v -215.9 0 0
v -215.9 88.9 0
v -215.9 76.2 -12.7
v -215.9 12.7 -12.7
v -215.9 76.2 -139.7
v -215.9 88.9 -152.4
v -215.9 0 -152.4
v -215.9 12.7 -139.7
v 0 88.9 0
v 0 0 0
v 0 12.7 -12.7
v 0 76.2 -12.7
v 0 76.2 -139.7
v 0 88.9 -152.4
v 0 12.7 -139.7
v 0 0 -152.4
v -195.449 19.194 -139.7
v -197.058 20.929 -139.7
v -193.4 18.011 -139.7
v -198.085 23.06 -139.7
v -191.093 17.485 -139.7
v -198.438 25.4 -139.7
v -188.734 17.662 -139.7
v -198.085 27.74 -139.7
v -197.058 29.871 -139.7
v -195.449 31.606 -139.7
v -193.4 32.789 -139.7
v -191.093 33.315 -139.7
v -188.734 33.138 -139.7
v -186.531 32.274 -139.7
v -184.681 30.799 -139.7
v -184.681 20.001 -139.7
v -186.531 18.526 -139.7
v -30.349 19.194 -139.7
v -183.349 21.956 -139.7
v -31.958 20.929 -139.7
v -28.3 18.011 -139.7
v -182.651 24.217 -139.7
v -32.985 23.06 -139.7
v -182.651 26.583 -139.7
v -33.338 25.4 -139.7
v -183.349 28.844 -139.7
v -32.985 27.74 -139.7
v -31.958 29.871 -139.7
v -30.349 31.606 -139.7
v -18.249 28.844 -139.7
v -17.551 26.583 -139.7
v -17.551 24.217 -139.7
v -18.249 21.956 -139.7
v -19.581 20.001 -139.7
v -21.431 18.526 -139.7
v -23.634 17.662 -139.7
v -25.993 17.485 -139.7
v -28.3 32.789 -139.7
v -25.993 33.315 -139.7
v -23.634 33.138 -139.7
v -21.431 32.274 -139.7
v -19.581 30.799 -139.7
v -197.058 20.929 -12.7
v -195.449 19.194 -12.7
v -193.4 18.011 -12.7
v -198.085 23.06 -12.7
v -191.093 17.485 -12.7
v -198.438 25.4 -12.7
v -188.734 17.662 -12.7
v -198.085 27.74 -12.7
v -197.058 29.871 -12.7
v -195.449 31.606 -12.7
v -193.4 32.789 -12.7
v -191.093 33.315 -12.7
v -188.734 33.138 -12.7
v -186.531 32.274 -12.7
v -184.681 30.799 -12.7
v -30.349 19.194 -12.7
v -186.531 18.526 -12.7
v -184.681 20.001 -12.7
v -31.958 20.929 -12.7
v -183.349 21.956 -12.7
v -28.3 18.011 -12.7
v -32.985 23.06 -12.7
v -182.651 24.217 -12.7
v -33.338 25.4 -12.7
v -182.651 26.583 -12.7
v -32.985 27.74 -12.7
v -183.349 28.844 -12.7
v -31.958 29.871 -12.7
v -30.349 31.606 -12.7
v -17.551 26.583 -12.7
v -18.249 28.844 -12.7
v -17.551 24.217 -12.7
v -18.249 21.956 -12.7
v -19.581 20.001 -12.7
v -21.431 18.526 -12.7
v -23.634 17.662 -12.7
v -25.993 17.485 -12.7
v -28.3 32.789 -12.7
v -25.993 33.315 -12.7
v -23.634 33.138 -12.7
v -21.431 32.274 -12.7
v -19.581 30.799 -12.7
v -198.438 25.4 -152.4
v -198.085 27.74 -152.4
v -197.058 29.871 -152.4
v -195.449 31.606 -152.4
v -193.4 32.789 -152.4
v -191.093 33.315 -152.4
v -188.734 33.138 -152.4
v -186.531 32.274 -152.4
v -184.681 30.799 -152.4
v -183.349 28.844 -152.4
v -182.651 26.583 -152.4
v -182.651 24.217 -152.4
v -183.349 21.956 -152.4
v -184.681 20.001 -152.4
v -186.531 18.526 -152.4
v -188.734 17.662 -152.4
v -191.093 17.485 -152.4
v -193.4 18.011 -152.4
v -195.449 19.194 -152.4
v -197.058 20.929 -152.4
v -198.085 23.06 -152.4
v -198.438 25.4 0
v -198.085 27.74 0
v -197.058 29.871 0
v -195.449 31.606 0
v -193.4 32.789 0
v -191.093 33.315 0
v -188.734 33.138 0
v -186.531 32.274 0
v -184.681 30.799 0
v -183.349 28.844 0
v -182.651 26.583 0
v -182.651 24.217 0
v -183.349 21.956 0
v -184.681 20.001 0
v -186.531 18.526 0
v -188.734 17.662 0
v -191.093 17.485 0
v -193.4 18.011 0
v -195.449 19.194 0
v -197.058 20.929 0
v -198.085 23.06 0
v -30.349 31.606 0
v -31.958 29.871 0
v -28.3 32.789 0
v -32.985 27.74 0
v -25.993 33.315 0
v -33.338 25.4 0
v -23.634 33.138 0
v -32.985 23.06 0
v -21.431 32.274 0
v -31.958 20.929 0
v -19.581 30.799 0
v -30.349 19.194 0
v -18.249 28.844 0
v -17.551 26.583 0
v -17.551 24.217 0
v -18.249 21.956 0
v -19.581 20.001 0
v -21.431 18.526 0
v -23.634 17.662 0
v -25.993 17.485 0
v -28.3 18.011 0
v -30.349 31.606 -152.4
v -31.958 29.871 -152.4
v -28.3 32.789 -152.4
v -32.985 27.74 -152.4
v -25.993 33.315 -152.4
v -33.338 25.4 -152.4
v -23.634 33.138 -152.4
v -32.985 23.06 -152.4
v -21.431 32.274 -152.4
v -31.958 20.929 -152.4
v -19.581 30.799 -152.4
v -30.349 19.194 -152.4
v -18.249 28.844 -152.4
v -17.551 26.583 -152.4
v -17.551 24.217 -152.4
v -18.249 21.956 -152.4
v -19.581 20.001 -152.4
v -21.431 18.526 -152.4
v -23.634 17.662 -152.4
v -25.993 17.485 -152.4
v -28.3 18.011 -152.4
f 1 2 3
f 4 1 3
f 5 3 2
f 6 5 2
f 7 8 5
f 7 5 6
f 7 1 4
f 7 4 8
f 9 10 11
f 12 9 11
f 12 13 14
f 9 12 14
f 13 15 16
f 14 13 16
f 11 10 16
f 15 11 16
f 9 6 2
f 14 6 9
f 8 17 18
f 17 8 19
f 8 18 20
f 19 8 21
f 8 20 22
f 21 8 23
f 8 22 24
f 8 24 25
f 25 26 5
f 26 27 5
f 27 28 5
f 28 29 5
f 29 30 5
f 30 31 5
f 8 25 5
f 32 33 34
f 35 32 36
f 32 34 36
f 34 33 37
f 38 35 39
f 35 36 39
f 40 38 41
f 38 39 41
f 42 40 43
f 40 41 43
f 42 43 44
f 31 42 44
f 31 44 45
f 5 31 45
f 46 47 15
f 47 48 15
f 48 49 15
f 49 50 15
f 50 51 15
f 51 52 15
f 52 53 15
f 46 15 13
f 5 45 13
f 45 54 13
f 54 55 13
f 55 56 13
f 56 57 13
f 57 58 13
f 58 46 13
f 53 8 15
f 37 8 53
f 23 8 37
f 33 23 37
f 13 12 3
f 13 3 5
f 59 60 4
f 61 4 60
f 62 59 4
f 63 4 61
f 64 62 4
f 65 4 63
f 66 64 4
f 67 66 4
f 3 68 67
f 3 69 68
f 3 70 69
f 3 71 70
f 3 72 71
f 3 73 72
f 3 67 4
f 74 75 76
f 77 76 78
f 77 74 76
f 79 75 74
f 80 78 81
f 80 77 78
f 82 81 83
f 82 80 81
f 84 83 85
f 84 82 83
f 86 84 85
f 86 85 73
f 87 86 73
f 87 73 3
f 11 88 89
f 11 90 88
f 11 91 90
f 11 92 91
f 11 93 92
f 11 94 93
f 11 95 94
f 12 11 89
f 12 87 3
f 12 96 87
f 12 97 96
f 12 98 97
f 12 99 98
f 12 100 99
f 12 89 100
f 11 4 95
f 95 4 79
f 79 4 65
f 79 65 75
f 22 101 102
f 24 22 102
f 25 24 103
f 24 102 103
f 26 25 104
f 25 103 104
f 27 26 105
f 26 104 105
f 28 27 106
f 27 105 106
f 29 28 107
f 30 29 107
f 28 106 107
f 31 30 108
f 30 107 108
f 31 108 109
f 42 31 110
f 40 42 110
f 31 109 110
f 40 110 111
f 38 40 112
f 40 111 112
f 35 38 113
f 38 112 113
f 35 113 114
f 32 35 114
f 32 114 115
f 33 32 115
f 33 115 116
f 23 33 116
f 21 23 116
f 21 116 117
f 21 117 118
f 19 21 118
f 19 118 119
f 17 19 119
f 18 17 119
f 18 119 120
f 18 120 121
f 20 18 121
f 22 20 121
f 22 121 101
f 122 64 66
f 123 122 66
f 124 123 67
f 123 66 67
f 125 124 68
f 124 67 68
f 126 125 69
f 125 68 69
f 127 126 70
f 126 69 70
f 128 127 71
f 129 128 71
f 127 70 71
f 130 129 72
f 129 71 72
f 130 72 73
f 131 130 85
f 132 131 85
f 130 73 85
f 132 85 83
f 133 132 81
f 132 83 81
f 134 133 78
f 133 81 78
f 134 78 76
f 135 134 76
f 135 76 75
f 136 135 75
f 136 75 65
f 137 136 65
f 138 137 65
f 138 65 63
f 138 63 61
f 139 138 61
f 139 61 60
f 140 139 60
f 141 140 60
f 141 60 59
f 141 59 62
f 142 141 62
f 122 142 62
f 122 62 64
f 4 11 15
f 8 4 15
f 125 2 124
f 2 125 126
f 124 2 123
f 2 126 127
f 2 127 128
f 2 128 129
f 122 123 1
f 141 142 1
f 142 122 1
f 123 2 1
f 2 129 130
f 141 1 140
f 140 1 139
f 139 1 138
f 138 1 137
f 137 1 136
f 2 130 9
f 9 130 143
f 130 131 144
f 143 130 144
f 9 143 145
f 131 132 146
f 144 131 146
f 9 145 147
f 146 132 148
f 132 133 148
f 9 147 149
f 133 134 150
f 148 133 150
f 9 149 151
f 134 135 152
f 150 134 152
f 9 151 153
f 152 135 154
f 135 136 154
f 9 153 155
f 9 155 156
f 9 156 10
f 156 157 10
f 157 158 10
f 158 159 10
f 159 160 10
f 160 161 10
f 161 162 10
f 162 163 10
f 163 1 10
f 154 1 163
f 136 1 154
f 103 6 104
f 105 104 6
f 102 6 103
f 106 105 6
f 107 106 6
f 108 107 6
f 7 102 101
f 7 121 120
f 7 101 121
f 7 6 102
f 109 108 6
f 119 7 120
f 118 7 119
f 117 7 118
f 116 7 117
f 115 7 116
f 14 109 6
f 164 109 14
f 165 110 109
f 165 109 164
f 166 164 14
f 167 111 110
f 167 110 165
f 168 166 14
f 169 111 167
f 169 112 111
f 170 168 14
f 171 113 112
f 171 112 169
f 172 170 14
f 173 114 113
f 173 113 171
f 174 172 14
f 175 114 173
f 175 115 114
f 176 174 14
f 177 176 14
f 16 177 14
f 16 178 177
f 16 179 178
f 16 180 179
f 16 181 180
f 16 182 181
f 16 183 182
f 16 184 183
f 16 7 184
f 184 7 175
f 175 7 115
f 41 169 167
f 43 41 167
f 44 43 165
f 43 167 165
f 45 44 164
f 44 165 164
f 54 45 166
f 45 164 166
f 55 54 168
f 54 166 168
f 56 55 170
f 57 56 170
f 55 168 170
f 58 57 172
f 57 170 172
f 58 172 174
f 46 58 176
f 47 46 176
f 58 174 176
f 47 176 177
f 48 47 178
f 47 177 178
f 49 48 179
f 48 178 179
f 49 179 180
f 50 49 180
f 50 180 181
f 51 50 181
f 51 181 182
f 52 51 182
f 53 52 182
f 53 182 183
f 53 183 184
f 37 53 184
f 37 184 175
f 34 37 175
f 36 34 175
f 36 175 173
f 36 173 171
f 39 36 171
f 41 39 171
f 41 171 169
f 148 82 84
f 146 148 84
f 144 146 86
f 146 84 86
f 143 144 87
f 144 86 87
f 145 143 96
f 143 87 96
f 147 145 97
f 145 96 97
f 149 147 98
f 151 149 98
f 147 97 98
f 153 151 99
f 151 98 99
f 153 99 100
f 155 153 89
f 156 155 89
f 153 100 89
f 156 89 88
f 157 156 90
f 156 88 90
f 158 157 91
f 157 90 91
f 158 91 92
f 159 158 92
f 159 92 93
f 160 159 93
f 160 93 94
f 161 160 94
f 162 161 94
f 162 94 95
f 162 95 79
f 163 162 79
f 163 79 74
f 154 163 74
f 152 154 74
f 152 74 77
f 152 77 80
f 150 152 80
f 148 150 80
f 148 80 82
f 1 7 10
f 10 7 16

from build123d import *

# Parameters (mm, degrees)
SKETCH1_W                    = 215.9
SKETCH1_H                    = 152.4
BOSS_EXTRUDE1_DEPTH          = 88.9
F_5_8_0_625_DIAMETER_HOLE1_D = 15.875
SKETCH9_W                    = 127
SKETCH9_H                    = 63.5
CUT_EXTRUDE1_DEPTH           = 279.822129681


with BuildPart() as part:
    # Sketch1 → Boss-Extrude1 (new body)
    with BuildSketch(Plane(origin=(0, 0, 0), x_dir=(1, 0, 0), z_dir=(0, 1, 0))):
        with Locations((-107.95, 76.2)):
            Rectangle(SKETCH1_W, SKETCH1_H)
    extrude(amount=BOSS_EXTRUDE1_DEPTH)

    # 5/8 (0.625) Diameter Hole1 (through all)
    with Locations(Plane.XY):
        with Locations((-190.5, 25.4), (-25.4, 25.4)):
            Hole(F_5_8_0_625_DIAMETER_HOLE1_D / 2)

    # Sketch9 → Cut-Extrude1 (cut, through all)
    with BuildSketch(Plane(origin=(0, 0, 0), x_dir=(0, 0, -1), z_dir=(1, 0, 0))):
        with Locations((76.2, 44.45)):
            Rectangle(SKETCH9_W, SKETCH9_H)
    extrude(amount=-CUT_EXTRUDE1_DEPTH, mode=Mode.SUBTRACT)


solid = part.part
